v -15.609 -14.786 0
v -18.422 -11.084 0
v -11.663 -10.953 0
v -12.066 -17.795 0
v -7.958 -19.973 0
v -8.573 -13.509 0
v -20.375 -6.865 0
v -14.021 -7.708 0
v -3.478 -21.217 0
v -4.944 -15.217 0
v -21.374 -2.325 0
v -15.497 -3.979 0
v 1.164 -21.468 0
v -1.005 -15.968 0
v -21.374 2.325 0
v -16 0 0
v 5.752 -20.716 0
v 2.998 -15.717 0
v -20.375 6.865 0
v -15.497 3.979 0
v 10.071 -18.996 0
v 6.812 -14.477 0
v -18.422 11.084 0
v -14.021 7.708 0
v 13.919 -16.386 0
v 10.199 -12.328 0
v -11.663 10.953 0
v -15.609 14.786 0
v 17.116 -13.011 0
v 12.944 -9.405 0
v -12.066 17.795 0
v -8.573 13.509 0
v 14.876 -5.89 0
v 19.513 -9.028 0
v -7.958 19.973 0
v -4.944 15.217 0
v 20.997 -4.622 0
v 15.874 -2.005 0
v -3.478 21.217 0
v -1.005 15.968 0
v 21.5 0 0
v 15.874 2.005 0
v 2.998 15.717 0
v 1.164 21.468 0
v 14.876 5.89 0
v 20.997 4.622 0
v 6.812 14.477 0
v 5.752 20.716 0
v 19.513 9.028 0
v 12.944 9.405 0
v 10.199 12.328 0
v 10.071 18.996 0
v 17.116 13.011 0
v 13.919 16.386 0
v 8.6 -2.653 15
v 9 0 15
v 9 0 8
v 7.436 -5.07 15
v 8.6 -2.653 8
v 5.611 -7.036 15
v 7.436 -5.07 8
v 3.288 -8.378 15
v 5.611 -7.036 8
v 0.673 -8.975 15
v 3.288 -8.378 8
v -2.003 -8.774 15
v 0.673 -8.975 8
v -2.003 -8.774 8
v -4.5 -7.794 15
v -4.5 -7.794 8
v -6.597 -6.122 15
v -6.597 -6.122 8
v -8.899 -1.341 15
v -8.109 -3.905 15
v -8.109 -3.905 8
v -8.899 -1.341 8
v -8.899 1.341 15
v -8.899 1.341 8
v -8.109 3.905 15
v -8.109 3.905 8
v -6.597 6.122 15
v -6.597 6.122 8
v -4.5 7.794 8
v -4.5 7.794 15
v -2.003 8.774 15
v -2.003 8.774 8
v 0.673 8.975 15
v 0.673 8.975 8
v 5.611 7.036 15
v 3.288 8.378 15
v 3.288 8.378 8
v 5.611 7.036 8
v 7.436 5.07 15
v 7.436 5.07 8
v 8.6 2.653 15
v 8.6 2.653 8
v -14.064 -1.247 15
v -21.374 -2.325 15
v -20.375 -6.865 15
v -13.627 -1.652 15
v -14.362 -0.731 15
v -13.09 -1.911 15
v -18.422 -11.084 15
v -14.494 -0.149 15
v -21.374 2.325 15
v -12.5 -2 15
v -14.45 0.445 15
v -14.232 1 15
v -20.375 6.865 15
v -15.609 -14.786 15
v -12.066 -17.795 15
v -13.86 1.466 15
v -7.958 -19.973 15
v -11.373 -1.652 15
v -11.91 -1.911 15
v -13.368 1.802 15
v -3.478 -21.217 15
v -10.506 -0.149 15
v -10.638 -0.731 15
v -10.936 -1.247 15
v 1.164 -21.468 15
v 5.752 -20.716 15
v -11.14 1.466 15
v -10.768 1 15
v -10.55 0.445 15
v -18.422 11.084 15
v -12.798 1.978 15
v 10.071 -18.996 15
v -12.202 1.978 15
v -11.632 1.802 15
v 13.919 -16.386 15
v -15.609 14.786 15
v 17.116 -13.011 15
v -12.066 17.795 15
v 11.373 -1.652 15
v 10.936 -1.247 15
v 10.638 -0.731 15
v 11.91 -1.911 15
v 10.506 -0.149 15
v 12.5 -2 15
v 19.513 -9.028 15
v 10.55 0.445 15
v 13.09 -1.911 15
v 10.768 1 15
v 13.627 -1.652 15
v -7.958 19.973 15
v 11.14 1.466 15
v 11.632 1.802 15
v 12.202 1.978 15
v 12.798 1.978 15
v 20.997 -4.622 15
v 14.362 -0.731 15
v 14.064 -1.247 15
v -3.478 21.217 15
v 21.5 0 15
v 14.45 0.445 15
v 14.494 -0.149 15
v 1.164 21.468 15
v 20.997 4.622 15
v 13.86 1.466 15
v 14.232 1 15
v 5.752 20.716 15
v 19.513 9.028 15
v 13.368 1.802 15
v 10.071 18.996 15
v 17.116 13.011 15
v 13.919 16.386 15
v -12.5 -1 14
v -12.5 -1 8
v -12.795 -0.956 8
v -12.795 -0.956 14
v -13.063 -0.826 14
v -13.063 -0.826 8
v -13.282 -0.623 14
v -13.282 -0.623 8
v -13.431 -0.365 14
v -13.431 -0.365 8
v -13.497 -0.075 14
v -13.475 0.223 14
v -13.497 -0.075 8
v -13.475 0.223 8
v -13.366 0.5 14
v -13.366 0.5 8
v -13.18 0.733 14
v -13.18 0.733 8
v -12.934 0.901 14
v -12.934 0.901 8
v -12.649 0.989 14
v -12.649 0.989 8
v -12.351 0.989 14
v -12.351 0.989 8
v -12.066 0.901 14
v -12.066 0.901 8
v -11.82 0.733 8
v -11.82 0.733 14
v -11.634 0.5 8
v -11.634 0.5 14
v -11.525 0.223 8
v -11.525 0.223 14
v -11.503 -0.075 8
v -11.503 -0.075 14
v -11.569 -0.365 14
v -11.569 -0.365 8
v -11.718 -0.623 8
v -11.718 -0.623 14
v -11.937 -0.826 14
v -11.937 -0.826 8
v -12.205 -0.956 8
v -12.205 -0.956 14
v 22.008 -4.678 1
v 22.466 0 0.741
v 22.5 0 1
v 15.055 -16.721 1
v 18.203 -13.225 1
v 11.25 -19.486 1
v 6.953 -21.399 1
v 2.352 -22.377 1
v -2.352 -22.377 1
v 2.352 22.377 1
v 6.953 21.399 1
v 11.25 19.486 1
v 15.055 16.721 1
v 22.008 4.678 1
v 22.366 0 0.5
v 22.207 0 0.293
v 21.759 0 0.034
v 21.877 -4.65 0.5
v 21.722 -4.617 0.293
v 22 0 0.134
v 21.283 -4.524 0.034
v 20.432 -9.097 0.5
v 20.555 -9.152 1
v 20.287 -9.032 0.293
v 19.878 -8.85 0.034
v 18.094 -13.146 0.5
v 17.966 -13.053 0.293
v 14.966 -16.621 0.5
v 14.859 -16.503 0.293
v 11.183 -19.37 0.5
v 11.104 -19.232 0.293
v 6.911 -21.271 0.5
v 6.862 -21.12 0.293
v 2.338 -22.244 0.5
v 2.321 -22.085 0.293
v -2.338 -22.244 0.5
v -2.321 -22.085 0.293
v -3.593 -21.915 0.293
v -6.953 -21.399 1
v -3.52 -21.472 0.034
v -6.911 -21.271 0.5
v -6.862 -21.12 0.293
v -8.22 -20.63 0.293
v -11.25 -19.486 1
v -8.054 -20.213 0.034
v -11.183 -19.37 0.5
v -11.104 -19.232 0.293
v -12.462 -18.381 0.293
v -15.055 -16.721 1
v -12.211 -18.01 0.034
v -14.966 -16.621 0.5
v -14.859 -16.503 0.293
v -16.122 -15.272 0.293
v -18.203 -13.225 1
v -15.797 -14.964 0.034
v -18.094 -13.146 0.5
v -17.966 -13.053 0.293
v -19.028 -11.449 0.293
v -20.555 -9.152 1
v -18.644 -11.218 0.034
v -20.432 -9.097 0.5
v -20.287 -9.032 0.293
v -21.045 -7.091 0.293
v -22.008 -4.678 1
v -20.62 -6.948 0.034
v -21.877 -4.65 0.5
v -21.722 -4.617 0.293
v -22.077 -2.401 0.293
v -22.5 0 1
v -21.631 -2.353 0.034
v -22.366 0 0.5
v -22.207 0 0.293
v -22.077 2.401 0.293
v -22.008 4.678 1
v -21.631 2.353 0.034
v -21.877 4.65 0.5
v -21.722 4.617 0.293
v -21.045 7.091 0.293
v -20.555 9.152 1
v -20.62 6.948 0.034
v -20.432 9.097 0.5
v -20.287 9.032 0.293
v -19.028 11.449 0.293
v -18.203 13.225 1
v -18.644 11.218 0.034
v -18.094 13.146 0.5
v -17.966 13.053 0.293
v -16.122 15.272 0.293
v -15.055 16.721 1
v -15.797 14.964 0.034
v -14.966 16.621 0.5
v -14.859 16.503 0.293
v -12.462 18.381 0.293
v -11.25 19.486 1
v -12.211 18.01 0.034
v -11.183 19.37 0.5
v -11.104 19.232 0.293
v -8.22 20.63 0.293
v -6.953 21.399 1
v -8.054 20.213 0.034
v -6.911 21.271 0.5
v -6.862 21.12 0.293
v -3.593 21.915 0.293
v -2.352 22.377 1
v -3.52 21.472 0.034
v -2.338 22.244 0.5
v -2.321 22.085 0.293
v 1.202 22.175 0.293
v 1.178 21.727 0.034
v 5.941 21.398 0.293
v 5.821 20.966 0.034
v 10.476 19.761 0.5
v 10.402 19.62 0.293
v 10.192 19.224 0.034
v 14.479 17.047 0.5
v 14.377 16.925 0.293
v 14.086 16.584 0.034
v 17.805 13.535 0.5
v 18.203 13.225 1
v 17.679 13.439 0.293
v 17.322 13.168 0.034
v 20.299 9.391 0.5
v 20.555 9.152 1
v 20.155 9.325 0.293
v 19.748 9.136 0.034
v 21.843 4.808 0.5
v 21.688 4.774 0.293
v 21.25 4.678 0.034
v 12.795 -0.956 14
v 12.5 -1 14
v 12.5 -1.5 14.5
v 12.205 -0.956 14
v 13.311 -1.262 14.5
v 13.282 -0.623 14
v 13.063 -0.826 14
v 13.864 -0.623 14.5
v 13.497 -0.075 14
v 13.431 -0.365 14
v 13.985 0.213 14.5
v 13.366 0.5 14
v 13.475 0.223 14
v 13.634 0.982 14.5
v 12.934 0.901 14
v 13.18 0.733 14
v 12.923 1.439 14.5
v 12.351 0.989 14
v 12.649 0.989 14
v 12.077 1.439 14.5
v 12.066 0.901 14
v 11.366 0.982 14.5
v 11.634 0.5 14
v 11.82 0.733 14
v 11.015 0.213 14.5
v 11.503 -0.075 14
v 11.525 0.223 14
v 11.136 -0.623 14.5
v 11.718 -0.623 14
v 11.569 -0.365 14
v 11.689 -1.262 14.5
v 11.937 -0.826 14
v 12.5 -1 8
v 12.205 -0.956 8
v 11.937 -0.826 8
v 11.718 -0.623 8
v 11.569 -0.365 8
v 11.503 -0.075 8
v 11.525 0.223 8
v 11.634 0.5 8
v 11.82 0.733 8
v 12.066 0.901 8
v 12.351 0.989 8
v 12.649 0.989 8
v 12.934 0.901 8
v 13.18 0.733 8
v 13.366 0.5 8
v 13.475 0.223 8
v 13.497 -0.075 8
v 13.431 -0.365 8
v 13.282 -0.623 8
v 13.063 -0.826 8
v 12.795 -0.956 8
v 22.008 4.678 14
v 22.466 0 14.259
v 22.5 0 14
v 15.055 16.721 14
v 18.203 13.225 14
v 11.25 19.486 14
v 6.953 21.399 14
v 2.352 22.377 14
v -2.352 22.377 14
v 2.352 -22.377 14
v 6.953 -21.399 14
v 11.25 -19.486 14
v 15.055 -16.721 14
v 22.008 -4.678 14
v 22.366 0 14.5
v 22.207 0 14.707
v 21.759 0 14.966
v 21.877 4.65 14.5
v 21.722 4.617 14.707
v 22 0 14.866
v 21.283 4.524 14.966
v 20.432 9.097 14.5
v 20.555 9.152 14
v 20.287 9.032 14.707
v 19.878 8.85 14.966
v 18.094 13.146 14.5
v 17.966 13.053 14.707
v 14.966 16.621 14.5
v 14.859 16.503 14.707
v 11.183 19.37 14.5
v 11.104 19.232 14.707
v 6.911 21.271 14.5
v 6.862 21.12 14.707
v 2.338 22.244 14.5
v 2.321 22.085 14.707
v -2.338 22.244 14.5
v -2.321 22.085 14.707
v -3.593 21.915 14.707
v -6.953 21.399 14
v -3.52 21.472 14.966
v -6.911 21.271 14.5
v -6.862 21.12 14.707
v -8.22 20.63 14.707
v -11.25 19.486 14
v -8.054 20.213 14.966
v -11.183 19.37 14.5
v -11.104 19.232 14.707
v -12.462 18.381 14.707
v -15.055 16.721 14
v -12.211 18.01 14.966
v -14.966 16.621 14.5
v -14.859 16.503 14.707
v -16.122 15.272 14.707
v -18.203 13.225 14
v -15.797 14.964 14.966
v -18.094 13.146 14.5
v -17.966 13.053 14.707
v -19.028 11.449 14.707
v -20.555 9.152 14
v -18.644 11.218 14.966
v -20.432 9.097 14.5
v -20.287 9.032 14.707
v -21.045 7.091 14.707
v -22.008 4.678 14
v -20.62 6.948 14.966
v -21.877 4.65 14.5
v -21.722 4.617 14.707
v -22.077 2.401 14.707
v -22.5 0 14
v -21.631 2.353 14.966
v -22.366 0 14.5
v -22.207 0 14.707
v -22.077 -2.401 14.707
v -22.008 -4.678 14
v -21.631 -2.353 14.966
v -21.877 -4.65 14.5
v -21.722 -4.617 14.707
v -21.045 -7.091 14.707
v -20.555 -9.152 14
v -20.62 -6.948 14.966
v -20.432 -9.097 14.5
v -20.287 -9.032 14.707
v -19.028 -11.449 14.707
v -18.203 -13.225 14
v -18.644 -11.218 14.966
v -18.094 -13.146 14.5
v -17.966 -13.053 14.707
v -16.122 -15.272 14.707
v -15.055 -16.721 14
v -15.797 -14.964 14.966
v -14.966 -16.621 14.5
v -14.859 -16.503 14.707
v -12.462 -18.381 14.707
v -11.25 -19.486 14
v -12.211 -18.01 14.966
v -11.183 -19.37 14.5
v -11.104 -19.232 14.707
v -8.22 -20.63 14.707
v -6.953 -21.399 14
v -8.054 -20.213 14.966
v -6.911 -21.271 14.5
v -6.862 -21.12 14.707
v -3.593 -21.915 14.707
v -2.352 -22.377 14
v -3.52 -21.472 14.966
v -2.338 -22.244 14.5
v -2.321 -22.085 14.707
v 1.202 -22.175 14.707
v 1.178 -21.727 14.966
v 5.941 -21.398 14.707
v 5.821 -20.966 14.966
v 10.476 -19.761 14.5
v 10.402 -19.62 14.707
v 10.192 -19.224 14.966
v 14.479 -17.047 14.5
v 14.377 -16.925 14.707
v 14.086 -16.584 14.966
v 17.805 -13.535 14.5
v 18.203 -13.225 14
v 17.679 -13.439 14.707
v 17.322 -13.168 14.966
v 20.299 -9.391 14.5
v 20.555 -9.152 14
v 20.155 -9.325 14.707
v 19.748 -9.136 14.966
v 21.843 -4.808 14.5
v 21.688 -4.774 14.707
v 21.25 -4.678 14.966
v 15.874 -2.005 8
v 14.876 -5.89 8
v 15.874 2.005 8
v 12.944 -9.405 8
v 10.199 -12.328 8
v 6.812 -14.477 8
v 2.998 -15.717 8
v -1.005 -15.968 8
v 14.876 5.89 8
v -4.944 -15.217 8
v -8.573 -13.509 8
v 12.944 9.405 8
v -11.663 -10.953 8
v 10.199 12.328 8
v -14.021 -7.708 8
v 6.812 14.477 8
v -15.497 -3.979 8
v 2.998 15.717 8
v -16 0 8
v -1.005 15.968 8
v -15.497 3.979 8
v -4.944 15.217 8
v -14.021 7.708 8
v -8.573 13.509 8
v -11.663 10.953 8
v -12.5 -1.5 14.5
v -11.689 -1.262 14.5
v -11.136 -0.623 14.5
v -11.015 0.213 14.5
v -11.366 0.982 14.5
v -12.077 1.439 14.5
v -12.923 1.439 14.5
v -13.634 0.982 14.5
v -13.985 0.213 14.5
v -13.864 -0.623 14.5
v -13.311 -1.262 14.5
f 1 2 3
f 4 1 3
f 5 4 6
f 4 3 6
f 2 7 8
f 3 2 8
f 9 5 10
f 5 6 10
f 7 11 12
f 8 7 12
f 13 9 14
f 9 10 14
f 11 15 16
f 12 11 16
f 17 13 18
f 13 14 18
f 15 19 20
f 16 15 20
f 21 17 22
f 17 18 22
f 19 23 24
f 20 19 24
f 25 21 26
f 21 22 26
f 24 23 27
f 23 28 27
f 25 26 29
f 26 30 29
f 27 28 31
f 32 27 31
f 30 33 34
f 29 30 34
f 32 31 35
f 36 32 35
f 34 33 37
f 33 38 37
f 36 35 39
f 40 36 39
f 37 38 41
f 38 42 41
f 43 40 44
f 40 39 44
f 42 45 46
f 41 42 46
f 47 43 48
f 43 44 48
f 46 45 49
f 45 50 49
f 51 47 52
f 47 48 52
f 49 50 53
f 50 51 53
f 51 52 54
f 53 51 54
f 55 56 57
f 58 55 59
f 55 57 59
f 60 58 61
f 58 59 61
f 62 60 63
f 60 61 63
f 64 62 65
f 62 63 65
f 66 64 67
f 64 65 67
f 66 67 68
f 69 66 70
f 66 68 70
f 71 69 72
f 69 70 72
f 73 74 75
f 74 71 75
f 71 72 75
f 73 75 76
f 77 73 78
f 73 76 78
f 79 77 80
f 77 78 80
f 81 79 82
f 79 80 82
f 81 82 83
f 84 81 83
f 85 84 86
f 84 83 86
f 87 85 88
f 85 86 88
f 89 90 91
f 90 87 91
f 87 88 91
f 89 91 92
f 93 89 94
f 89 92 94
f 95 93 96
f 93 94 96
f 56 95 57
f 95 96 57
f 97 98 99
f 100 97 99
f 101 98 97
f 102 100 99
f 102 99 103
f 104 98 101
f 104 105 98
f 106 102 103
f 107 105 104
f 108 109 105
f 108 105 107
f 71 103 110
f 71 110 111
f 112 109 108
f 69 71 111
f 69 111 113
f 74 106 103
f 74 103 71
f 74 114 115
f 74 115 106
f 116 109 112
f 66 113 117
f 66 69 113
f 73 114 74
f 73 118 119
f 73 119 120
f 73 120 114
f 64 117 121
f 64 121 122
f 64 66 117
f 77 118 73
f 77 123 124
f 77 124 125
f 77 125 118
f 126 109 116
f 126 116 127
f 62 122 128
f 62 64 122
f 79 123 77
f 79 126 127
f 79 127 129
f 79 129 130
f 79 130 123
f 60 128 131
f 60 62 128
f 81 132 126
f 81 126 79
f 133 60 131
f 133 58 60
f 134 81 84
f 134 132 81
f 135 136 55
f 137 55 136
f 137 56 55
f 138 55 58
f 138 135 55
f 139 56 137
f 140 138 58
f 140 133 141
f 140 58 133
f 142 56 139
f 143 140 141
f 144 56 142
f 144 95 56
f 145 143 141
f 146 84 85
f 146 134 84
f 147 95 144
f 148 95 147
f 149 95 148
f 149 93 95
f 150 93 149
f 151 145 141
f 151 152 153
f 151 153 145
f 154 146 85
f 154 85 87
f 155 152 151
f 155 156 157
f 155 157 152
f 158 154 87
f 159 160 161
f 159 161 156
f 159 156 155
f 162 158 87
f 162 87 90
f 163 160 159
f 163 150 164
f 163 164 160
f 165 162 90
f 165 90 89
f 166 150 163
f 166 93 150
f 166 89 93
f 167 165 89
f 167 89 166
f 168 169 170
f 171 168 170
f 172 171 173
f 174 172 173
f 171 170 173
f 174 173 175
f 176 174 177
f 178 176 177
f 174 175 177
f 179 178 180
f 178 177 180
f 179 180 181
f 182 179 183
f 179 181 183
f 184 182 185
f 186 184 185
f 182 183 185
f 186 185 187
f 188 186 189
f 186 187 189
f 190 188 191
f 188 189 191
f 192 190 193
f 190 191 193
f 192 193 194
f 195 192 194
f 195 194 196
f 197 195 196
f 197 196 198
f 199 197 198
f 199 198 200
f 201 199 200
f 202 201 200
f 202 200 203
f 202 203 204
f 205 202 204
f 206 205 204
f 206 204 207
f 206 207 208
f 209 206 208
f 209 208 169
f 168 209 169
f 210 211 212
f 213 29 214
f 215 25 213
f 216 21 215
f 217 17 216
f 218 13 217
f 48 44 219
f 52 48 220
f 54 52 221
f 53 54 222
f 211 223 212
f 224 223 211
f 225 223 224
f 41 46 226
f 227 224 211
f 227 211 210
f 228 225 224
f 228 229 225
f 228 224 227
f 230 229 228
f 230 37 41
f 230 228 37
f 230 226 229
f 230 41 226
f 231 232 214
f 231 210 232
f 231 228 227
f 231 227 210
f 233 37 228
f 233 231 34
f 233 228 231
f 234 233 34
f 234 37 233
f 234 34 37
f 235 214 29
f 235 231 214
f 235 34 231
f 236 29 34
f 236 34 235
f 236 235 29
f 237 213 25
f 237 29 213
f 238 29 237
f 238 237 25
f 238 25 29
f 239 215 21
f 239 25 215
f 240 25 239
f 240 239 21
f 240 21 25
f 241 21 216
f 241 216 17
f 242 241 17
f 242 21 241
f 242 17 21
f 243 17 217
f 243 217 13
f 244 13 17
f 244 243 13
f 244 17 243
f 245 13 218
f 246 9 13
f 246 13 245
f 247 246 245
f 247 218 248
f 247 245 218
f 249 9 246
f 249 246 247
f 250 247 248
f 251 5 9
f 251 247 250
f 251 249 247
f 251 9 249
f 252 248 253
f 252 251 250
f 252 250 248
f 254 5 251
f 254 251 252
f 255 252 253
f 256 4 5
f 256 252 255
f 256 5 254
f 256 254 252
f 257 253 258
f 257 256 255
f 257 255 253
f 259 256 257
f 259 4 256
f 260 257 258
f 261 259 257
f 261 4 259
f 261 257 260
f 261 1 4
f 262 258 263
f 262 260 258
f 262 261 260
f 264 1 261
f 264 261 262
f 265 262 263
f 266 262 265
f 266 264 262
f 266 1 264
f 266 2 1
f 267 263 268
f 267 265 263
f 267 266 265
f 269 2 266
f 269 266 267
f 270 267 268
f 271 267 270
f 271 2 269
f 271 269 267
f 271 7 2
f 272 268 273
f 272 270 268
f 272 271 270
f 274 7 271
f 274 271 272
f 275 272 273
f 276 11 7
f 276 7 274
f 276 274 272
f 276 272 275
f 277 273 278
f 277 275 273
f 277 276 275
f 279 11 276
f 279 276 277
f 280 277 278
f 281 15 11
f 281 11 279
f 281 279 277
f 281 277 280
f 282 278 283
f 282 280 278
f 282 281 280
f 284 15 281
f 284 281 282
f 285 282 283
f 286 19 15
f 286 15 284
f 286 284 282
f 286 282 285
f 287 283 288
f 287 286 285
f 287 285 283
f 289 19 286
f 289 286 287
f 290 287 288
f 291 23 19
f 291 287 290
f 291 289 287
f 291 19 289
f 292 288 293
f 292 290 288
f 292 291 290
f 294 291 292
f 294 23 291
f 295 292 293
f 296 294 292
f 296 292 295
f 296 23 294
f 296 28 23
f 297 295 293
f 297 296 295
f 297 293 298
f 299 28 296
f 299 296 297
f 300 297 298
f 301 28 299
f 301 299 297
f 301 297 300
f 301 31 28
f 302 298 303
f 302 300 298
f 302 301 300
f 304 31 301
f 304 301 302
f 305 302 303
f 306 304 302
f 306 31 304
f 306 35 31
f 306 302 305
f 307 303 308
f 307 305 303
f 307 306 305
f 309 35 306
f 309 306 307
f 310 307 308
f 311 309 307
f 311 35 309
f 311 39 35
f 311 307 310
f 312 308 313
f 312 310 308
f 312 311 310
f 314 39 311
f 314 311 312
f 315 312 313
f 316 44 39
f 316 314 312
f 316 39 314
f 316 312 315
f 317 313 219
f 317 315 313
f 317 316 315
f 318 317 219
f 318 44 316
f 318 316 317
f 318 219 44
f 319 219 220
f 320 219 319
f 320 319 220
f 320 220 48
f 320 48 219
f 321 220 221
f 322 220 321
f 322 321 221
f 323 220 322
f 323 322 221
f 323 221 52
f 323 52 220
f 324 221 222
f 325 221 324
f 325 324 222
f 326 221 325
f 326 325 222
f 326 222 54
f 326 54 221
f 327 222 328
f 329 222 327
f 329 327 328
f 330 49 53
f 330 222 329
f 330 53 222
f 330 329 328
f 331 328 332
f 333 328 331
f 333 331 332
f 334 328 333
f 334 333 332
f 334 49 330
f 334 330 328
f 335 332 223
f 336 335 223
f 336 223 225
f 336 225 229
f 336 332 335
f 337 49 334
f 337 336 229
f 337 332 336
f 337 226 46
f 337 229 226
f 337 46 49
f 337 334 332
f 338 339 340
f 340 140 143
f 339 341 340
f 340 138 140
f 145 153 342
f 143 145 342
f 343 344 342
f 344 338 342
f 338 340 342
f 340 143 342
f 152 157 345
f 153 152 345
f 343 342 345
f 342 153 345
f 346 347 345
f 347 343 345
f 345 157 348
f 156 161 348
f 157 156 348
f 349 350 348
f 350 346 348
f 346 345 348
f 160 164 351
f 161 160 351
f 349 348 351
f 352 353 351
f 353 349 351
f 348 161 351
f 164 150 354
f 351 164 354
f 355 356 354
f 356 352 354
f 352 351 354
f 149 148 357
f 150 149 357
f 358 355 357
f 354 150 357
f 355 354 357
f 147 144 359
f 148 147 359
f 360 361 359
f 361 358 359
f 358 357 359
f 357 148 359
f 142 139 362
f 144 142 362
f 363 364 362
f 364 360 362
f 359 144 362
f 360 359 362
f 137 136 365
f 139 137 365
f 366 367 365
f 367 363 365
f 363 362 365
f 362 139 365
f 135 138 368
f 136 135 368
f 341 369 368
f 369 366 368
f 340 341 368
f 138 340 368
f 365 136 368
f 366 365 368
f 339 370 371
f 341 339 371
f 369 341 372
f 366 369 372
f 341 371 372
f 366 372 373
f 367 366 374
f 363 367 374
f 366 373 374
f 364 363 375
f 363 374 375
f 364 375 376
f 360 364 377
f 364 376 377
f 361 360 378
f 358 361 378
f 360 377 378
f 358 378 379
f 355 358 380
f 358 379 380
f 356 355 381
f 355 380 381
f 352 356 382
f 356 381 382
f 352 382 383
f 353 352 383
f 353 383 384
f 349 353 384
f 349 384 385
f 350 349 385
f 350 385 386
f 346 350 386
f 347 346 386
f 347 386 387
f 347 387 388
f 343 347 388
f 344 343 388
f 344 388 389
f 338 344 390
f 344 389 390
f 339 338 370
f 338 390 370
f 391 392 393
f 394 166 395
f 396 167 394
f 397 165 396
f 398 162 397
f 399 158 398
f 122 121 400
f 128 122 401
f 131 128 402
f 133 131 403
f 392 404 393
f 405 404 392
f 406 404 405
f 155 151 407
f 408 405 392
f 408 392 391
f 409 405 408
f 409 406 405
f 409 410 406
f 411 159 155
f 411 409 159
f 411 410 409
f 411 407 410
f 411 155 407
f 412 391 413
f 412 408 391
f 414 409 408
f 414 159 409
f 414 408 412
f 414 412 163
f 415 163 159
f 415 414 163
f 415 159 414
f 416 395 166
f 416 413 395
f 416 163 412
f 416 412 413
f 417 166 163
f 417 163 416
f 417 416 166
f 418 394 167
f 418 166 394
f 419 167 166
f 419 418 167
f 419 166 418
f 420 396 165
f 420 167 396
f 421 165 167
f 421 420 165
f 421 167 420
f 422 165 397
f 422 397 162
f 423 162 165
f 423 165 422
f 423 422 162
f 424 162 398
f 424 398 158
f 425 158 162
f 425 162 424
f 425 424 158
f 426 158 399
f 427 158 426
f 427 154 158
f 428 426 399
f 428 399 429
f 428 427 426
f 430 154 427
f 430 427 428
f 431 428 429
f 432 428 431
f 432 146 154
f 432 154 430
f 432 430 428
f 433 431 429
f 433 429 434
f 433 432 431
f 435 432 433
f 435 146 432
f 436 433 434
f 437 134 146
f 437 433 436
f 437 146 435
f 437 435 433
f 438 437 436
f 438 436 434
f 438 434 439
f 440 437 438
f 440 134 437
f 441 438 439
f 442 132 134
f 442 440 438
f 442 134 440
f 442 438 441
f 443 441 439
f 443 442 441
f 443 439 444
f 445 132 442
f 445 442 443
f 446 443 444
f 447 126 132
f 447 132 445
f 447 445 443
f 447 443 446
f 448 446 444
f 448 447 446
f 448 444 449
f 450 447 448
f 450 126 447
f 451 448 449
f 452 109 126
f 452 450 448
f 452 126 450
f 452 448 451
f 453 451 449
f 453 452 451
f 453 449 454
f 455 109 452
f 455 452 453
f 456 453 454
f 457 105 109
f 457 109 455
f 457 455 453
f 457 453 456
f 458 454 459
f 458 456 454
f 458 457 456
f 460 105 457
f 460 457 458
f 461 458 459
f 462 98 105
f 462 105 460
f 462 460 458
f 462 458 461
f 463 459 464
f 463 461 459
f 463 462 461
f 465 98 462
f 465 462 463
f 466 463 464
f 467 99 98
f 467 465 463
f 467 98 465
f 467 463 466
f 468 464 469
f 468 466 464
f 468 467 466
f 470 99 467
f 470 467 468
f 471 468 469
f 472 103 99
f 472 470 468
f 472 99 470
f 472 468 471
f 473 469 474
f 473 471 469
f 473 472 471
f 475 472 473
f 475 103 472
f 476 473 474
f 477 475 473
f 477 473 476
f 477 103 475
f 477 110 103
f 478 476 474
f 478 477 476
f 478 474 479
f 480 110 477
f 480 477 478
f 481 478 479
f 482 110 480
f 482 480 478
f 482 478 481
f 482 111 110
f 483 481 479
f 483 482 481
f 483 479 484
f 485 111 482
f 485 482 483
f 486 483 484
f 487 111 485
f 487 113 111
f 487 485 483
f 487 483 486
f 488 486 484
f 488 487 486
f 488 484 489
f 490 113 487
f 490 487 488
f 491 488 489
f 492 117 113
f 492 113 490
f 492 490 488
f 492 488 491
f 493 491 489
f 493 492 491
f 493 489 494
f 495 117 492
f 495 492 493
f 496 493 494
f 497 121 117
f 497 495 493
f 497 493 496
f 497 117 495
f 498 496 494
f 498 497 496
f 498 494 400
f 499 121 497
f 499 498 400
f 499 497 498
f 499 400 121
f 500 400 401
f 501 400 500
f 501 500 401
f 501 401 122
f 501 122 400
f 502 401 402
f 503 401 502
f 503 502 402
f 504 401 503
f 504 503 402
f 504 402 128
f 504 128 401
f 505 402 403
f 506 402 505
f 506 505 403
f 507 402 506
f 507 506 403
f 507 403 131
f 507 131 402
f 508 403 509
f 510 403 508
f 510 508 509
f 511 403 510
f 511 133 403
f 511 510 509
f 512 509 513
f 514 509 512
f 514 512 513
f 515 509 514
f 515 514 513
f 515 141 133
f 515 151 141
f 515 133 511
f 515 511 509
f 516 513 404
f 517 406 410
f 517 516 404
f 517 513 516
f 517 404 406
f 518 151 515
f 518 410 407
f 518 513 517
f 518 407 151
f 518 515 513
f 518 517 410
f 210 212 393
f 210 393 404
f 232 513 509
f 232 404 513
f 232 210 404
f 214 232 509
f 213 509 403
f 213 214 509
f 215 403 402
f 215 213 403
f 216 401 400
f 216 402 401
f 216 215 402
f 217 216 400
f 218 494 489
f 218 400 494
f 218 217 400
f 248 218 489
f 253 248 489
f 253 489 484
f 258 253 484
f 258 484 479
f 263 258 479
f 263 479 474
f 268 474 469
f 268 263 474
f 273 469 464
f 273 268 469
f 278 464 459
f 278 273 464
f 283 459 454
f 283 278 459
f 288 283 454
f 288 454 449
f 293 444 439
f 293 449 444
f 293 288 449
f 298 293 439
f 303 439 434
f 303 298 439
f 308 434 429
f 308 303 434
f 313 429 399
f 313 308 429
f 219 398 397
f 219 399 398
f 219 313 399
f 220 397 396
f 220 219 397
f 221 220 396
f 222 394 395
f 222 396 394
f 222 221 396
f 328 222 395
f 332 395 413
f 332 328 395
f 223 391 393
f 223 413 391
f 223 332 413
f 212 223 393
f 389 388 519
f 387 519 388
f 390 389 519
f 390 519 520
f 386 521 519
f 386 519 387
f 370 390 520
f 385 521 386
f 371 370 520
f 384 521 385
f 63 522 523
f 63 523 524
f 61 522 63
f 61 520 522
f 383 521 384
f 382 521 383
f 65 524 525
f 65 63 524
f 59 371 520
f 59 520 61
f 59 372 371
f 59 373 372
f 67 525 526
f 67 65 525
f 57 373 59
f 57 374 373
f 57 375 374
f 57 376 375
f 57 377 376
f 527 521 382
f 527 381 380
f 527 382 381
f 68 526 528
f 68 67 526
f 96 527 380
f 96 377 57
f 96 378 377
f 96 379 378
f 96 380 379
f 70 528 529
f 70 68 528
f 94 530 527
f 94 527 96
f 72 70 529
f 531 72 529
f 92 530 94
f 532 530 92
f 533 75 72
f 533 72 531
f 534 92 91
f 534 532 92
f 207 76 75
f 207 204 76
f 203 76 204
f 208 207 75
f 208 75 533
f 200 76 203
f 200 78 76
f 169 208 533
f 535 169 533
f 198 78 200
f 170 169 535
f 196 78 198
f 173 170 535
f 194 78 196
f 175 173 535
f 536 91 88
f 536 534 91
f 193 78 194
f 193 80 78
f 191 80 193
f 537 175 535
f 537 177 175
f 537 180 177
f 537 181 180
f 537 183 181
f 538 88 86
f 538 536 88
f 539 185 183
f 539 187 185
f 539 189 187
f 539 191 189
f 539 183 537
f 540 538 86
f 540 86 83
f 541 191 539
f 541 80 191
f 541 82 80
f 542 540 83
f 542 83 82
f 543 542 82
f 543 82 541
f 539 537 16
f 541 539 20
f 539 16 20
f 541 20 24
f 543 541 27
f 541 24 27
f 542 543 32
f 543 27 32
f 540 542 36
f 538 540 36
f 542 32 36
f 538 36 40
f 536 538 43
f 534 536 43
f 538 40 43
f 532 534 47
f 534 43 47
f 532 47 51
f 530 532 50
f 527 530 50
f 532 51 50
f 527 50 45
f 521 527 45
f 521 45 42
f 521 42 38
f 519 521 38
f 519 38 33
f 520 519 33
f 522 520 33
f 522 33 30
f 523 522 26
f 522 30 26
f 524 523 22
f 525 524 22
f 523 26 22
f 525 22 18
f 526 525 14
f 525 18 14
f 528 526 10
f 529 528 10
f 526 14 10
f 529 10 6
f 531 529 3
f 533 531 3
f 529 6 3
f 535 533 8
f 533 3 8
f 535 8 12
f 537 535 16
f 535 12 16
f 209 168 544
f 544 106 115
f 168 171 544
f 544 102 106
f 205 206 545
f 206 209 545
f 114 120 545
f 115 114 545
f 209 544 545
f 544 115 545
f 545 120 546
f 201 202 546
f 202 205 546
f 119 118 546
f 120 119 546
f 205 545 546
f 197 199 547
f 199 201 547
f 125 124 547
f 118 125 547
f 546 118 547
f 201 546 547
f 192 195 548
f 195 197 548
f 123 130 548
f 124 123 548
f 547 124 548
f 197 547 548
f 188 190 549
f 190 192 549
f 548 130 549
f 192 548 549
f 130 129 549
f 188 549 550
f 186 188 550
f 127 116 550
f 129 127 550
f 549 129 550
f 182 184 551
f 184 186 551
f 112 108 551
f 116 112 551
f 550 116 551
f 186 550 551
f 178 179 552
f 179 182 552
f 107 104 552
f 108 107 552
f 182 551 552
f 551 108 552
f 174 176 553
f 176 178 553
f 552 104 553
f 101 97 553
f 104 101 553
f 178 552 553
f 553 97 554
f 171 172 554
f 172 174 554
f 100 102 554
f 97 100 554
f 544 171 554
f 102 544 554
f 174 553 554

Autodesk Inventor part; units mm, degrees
ref_plane "YZ Plane" through (0, 0, 0) normal (1, 0, 0) x (0, 1, 0)
ref_plane "XZ Plane" through (0, 0, 0) normal (0, 1, 0) x (-1, 0, 0)
ref_plane "XY Plane" through (0, 0, 0) normal (0, 0, 1) x (1, 0, 0)
sketch "Skizze1" plane through (0, 0, 0) normal (0, 0, 1) x (1, 0, 0)
  circle A0 centre (0, 0) radius 22.5
  circle A1 centre (0, 0) radius 9
  dimension "d0" = 45
  dimension "d2" = 9
extrude "Extrusion1" add sketch "Skizze1" along normal blind 15
sketch "Skizze3" plane through (0, 0, 0) normal (0, 0, -1) x (-1, 0, 0)
  circle A0 centre (0, 0) radius 9 projected
  circle A1 centre (0, 0) radius 22.5 projected
  circle A2 centre (0, 0) radius 16
  dimension "d5" = 32
extrude "Extrusion2" cut sketch "Skizze3" against normal blind 8 contours A2
sketch "Skizze4" plane through (0, 0, 15) normal (0, 0, 1) x (1, 0, 0)
  circle A0 centre (0, 0) radius 9 projected
  circle A1 centre (0, 0) radius 16 projected
  line L0 (-27, 0) -> (36, 0) projected
  point P0 (-12.5, 0)
  point P1 (12.5, 0)
  dimension "d8" = 12.5
  dimension "d9" = 12.5
hole "Bohrung1" at (-12.5, 0, 15) at (12.5, 0, 15) direction (0, 0, -1) diameter 2 end through all countersink diameter 4 countersink angle 90
fillet "Rundung1" radius 1 2 edges at (-22.5, 0, 15) (-22.5, 0, 0)
equation "\"d9\" = d8"
properties part number "Griff01"
